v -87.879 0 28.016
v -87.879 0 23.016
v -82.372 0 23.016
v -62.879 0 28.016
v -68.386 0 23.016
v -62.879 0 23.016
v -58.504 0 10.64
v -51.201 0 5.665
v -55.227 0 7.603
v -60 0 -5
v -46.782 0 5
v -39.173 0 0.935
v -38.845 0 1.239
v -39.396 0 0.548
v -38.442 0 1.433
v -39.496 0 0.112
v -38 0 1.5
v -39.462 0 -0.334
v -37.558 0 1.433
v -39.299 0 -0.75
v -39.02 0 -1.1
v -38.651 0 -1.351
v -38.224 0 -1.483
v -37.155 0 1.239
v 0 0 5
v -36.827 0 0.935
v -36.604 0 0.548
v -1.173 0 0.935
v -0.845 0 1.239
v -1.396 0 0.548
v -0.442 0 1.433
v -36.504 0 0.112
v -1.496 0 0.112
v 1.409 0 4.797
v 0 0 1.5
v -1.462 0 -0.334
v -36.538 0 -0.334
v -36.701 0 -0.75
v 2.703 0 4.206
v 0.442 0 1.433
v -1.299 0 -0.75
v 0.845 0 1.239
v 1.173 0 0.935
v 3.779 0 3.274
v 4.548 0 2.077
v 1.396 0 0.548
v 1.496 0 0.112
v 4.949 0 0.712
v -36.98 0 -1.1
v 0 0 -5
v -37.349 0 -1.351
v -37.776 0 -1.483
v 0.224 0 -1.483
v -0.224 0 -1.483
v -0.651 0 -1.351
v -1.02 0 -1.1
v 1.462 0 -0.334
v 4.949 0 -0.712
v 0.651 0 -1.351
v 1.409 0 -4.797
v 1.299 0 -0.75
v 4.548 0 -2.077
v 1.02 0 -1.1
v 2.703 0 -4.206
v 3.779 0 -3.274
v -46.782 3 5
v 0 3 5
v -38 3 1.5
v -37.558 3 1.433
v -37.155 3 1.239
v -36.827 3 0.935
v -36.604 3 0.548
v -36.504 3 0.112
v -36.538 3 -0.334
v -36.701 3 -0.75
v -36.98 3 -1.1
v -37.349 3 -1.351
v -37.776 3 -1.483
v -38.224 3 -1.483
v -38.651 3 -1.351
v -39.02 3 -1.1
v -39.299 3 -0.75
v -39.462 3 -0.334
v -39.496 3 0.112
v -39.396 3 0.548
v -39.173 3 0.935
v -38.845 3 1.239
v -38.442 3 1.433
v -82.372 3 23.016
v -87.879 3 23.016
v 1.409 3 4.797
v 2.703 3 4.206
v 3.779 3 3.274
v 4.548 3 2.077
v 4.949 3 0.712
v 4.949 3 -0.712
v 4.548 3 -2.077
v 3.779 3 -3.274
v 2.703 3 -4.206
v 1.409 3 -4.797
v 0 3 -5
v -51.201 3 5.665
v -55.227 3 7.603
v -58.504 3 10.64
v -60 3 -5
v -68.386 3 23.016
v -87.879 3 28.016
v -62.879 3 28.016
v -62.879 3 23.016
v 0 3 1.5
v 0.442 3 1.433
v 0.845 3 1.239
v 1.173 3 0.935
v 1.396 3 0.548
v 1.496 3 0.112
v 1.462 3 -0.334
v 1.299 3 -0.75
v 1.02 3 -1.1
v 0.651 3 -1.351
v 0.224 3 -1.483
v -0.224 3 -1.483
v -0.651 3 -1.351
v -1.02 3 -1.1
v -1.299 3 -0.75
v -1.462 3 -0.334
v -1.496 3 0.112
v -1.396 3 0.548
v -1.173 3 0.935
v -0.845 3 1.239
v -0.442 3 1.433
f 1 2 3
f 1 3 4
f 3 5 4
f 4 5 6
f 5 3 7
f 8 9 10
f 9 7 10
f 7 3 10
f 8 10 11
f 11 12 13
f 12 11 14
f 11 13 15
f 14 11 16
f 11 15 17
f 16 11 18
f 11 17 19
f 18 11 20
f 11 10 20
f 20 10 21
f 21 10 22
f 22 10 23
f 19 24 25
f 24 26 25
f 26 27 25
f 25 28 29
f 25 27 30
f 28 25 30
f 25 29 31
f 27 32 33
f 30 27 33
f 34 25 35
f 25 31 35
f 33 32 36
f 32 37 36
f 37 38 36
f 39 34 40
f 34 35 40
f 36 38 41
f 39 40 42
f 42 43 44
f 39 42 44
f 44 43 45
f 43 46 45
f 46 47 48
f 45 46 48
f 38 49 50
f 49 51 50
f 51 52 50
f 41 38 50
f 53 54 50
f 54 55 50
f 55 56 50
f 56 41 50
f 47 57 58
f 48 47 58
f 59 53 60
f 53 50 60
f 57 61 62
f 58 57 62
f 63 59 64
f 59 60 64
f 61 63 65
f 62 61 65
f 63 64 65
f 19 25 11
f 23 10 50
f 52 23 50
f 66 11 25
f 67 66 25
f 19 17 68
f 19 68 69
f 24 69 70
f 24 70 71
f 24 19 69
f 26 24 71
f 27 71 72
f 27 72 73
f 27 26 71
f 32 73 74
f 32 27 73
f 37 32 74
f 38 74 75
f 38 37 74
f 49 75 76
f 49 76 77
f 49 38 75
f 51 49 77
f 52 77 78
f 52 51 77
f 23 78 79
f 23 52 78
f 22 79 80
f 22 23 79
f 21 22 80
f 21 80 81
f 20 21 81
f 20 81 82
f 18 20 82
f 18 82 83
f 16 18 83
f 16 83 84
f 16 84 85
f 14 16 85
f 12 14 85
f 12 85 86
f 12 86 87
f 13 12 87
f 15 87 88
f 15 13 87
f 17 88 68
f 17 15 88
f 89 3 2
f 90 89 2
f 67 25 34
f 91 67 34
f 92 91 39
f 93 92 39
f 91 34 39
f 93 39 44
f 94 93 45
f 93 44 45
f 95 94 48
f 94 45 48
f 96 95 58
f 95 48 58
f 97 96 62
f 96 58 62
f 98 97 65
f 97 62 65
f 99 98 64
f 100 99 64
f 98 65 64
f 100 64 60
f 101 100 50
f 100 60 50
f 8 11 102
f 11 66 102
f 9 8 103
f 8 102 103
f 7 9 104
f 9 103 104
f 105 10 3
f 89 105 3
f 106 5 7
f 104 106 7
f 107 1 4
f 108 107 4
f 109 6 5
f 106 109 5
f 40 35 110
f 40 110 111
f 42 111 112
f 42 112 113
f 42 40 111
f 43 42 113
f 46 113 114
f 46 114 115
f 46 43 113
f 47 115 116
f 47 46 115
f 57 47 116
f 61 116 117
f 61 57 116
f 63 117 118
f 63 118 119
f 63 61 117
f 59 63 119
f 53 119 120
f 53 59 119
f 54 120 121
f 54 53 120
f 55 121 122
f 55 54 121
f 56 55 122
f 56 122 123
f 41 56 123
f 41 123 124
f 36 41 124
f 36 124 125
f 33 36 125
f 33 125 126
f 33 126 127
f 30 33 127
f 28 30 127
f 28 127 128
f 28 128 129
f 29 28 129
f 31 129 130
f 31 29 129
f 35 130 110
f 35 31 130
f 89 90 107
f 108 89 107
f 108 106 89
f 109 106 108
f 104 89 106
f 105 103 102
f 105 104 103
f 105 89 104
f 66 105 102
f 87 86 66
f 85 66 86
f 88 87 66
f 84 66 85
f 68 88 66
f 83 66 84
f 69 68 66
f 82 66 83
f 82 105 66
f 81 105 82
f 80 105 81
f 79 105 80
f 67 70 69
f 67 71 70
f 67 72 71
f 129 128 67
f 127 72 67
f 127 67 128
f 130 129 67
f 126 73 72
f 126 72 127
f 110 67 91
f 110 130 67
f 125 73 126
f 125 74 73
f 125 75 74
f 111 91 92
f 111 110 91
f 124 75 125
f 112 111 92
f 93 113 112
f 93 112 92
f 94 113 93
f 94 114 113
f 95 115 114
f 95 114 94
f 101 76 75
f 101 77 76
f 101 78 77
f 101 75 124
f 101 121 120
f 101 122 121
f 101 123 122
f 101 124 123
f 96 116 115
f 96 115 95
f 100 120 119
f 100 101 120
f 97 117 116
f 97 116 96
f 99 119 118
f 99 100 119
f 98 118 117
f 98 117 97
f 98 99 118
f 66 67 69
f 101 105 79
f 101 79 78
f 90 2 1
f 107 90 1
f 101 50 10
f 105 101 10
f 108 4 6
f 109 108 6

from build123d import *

# Parameters (mm, degrees)
SKETCH_1_R      = 1.5
EXTRUDE_1_DEPTH = 3
FILLET_5_R      = 15


with BuildPart() as part:
    # 草图1 → 凸台-拉伸1 (new body)
    with BuildSketch(Plane(origin=(0, 0, 0), x_dir=(1, 0, 0), z_dir=(0, 1, 0))):
        with BuildLine():
            Line((0, 5), (-60, 5))
            Line((-60, 5), (-82.371742522, -23.015711498))
            Line((-82.371742522, -23.015711498), (-87.879028911, -23.015711498))
            Line((-87.879028911, -23.015711498), (-87.879028911, -28.015711498))
            Line((-87.879028911, -28.015711498), (-62.879028911, -28.015711498))
            Line((-62.879028911, -28.015711498), (-62.879028911, -23.015711498))
            Line((-62.879028911, -23.015711498), (-68.3863153, -23.015711498))
            Line((-68.3863153, -23.015711498), (-54, -5))
            Line((-54, -5), (0, -5))
            ThreePointArc((0, -5), (5, 0), (0, 5))
        make_face()
        with Locations(Location((0, 0, 0), (0, 0, 270))):
            Circle(SKETCH_1_R, mode=Mode.SUBTRACT)
        with Locations(Location((-38, 0, 0), (0, 0, 270))):
            Circle(SKETCH_1_R, mode=Mode.SUBTRACT)
    extrude(amount=EXTRUDE_1_DEPTH)

    # 圆角5
    fillet_5_edges = [part.edges().sort_by_distance(p)[0] for p in [
        (-54, 1.5, 5),
    ]]
    fillet(fillet_5_edges, radius=FILLET_5_R)


solid = part.part
